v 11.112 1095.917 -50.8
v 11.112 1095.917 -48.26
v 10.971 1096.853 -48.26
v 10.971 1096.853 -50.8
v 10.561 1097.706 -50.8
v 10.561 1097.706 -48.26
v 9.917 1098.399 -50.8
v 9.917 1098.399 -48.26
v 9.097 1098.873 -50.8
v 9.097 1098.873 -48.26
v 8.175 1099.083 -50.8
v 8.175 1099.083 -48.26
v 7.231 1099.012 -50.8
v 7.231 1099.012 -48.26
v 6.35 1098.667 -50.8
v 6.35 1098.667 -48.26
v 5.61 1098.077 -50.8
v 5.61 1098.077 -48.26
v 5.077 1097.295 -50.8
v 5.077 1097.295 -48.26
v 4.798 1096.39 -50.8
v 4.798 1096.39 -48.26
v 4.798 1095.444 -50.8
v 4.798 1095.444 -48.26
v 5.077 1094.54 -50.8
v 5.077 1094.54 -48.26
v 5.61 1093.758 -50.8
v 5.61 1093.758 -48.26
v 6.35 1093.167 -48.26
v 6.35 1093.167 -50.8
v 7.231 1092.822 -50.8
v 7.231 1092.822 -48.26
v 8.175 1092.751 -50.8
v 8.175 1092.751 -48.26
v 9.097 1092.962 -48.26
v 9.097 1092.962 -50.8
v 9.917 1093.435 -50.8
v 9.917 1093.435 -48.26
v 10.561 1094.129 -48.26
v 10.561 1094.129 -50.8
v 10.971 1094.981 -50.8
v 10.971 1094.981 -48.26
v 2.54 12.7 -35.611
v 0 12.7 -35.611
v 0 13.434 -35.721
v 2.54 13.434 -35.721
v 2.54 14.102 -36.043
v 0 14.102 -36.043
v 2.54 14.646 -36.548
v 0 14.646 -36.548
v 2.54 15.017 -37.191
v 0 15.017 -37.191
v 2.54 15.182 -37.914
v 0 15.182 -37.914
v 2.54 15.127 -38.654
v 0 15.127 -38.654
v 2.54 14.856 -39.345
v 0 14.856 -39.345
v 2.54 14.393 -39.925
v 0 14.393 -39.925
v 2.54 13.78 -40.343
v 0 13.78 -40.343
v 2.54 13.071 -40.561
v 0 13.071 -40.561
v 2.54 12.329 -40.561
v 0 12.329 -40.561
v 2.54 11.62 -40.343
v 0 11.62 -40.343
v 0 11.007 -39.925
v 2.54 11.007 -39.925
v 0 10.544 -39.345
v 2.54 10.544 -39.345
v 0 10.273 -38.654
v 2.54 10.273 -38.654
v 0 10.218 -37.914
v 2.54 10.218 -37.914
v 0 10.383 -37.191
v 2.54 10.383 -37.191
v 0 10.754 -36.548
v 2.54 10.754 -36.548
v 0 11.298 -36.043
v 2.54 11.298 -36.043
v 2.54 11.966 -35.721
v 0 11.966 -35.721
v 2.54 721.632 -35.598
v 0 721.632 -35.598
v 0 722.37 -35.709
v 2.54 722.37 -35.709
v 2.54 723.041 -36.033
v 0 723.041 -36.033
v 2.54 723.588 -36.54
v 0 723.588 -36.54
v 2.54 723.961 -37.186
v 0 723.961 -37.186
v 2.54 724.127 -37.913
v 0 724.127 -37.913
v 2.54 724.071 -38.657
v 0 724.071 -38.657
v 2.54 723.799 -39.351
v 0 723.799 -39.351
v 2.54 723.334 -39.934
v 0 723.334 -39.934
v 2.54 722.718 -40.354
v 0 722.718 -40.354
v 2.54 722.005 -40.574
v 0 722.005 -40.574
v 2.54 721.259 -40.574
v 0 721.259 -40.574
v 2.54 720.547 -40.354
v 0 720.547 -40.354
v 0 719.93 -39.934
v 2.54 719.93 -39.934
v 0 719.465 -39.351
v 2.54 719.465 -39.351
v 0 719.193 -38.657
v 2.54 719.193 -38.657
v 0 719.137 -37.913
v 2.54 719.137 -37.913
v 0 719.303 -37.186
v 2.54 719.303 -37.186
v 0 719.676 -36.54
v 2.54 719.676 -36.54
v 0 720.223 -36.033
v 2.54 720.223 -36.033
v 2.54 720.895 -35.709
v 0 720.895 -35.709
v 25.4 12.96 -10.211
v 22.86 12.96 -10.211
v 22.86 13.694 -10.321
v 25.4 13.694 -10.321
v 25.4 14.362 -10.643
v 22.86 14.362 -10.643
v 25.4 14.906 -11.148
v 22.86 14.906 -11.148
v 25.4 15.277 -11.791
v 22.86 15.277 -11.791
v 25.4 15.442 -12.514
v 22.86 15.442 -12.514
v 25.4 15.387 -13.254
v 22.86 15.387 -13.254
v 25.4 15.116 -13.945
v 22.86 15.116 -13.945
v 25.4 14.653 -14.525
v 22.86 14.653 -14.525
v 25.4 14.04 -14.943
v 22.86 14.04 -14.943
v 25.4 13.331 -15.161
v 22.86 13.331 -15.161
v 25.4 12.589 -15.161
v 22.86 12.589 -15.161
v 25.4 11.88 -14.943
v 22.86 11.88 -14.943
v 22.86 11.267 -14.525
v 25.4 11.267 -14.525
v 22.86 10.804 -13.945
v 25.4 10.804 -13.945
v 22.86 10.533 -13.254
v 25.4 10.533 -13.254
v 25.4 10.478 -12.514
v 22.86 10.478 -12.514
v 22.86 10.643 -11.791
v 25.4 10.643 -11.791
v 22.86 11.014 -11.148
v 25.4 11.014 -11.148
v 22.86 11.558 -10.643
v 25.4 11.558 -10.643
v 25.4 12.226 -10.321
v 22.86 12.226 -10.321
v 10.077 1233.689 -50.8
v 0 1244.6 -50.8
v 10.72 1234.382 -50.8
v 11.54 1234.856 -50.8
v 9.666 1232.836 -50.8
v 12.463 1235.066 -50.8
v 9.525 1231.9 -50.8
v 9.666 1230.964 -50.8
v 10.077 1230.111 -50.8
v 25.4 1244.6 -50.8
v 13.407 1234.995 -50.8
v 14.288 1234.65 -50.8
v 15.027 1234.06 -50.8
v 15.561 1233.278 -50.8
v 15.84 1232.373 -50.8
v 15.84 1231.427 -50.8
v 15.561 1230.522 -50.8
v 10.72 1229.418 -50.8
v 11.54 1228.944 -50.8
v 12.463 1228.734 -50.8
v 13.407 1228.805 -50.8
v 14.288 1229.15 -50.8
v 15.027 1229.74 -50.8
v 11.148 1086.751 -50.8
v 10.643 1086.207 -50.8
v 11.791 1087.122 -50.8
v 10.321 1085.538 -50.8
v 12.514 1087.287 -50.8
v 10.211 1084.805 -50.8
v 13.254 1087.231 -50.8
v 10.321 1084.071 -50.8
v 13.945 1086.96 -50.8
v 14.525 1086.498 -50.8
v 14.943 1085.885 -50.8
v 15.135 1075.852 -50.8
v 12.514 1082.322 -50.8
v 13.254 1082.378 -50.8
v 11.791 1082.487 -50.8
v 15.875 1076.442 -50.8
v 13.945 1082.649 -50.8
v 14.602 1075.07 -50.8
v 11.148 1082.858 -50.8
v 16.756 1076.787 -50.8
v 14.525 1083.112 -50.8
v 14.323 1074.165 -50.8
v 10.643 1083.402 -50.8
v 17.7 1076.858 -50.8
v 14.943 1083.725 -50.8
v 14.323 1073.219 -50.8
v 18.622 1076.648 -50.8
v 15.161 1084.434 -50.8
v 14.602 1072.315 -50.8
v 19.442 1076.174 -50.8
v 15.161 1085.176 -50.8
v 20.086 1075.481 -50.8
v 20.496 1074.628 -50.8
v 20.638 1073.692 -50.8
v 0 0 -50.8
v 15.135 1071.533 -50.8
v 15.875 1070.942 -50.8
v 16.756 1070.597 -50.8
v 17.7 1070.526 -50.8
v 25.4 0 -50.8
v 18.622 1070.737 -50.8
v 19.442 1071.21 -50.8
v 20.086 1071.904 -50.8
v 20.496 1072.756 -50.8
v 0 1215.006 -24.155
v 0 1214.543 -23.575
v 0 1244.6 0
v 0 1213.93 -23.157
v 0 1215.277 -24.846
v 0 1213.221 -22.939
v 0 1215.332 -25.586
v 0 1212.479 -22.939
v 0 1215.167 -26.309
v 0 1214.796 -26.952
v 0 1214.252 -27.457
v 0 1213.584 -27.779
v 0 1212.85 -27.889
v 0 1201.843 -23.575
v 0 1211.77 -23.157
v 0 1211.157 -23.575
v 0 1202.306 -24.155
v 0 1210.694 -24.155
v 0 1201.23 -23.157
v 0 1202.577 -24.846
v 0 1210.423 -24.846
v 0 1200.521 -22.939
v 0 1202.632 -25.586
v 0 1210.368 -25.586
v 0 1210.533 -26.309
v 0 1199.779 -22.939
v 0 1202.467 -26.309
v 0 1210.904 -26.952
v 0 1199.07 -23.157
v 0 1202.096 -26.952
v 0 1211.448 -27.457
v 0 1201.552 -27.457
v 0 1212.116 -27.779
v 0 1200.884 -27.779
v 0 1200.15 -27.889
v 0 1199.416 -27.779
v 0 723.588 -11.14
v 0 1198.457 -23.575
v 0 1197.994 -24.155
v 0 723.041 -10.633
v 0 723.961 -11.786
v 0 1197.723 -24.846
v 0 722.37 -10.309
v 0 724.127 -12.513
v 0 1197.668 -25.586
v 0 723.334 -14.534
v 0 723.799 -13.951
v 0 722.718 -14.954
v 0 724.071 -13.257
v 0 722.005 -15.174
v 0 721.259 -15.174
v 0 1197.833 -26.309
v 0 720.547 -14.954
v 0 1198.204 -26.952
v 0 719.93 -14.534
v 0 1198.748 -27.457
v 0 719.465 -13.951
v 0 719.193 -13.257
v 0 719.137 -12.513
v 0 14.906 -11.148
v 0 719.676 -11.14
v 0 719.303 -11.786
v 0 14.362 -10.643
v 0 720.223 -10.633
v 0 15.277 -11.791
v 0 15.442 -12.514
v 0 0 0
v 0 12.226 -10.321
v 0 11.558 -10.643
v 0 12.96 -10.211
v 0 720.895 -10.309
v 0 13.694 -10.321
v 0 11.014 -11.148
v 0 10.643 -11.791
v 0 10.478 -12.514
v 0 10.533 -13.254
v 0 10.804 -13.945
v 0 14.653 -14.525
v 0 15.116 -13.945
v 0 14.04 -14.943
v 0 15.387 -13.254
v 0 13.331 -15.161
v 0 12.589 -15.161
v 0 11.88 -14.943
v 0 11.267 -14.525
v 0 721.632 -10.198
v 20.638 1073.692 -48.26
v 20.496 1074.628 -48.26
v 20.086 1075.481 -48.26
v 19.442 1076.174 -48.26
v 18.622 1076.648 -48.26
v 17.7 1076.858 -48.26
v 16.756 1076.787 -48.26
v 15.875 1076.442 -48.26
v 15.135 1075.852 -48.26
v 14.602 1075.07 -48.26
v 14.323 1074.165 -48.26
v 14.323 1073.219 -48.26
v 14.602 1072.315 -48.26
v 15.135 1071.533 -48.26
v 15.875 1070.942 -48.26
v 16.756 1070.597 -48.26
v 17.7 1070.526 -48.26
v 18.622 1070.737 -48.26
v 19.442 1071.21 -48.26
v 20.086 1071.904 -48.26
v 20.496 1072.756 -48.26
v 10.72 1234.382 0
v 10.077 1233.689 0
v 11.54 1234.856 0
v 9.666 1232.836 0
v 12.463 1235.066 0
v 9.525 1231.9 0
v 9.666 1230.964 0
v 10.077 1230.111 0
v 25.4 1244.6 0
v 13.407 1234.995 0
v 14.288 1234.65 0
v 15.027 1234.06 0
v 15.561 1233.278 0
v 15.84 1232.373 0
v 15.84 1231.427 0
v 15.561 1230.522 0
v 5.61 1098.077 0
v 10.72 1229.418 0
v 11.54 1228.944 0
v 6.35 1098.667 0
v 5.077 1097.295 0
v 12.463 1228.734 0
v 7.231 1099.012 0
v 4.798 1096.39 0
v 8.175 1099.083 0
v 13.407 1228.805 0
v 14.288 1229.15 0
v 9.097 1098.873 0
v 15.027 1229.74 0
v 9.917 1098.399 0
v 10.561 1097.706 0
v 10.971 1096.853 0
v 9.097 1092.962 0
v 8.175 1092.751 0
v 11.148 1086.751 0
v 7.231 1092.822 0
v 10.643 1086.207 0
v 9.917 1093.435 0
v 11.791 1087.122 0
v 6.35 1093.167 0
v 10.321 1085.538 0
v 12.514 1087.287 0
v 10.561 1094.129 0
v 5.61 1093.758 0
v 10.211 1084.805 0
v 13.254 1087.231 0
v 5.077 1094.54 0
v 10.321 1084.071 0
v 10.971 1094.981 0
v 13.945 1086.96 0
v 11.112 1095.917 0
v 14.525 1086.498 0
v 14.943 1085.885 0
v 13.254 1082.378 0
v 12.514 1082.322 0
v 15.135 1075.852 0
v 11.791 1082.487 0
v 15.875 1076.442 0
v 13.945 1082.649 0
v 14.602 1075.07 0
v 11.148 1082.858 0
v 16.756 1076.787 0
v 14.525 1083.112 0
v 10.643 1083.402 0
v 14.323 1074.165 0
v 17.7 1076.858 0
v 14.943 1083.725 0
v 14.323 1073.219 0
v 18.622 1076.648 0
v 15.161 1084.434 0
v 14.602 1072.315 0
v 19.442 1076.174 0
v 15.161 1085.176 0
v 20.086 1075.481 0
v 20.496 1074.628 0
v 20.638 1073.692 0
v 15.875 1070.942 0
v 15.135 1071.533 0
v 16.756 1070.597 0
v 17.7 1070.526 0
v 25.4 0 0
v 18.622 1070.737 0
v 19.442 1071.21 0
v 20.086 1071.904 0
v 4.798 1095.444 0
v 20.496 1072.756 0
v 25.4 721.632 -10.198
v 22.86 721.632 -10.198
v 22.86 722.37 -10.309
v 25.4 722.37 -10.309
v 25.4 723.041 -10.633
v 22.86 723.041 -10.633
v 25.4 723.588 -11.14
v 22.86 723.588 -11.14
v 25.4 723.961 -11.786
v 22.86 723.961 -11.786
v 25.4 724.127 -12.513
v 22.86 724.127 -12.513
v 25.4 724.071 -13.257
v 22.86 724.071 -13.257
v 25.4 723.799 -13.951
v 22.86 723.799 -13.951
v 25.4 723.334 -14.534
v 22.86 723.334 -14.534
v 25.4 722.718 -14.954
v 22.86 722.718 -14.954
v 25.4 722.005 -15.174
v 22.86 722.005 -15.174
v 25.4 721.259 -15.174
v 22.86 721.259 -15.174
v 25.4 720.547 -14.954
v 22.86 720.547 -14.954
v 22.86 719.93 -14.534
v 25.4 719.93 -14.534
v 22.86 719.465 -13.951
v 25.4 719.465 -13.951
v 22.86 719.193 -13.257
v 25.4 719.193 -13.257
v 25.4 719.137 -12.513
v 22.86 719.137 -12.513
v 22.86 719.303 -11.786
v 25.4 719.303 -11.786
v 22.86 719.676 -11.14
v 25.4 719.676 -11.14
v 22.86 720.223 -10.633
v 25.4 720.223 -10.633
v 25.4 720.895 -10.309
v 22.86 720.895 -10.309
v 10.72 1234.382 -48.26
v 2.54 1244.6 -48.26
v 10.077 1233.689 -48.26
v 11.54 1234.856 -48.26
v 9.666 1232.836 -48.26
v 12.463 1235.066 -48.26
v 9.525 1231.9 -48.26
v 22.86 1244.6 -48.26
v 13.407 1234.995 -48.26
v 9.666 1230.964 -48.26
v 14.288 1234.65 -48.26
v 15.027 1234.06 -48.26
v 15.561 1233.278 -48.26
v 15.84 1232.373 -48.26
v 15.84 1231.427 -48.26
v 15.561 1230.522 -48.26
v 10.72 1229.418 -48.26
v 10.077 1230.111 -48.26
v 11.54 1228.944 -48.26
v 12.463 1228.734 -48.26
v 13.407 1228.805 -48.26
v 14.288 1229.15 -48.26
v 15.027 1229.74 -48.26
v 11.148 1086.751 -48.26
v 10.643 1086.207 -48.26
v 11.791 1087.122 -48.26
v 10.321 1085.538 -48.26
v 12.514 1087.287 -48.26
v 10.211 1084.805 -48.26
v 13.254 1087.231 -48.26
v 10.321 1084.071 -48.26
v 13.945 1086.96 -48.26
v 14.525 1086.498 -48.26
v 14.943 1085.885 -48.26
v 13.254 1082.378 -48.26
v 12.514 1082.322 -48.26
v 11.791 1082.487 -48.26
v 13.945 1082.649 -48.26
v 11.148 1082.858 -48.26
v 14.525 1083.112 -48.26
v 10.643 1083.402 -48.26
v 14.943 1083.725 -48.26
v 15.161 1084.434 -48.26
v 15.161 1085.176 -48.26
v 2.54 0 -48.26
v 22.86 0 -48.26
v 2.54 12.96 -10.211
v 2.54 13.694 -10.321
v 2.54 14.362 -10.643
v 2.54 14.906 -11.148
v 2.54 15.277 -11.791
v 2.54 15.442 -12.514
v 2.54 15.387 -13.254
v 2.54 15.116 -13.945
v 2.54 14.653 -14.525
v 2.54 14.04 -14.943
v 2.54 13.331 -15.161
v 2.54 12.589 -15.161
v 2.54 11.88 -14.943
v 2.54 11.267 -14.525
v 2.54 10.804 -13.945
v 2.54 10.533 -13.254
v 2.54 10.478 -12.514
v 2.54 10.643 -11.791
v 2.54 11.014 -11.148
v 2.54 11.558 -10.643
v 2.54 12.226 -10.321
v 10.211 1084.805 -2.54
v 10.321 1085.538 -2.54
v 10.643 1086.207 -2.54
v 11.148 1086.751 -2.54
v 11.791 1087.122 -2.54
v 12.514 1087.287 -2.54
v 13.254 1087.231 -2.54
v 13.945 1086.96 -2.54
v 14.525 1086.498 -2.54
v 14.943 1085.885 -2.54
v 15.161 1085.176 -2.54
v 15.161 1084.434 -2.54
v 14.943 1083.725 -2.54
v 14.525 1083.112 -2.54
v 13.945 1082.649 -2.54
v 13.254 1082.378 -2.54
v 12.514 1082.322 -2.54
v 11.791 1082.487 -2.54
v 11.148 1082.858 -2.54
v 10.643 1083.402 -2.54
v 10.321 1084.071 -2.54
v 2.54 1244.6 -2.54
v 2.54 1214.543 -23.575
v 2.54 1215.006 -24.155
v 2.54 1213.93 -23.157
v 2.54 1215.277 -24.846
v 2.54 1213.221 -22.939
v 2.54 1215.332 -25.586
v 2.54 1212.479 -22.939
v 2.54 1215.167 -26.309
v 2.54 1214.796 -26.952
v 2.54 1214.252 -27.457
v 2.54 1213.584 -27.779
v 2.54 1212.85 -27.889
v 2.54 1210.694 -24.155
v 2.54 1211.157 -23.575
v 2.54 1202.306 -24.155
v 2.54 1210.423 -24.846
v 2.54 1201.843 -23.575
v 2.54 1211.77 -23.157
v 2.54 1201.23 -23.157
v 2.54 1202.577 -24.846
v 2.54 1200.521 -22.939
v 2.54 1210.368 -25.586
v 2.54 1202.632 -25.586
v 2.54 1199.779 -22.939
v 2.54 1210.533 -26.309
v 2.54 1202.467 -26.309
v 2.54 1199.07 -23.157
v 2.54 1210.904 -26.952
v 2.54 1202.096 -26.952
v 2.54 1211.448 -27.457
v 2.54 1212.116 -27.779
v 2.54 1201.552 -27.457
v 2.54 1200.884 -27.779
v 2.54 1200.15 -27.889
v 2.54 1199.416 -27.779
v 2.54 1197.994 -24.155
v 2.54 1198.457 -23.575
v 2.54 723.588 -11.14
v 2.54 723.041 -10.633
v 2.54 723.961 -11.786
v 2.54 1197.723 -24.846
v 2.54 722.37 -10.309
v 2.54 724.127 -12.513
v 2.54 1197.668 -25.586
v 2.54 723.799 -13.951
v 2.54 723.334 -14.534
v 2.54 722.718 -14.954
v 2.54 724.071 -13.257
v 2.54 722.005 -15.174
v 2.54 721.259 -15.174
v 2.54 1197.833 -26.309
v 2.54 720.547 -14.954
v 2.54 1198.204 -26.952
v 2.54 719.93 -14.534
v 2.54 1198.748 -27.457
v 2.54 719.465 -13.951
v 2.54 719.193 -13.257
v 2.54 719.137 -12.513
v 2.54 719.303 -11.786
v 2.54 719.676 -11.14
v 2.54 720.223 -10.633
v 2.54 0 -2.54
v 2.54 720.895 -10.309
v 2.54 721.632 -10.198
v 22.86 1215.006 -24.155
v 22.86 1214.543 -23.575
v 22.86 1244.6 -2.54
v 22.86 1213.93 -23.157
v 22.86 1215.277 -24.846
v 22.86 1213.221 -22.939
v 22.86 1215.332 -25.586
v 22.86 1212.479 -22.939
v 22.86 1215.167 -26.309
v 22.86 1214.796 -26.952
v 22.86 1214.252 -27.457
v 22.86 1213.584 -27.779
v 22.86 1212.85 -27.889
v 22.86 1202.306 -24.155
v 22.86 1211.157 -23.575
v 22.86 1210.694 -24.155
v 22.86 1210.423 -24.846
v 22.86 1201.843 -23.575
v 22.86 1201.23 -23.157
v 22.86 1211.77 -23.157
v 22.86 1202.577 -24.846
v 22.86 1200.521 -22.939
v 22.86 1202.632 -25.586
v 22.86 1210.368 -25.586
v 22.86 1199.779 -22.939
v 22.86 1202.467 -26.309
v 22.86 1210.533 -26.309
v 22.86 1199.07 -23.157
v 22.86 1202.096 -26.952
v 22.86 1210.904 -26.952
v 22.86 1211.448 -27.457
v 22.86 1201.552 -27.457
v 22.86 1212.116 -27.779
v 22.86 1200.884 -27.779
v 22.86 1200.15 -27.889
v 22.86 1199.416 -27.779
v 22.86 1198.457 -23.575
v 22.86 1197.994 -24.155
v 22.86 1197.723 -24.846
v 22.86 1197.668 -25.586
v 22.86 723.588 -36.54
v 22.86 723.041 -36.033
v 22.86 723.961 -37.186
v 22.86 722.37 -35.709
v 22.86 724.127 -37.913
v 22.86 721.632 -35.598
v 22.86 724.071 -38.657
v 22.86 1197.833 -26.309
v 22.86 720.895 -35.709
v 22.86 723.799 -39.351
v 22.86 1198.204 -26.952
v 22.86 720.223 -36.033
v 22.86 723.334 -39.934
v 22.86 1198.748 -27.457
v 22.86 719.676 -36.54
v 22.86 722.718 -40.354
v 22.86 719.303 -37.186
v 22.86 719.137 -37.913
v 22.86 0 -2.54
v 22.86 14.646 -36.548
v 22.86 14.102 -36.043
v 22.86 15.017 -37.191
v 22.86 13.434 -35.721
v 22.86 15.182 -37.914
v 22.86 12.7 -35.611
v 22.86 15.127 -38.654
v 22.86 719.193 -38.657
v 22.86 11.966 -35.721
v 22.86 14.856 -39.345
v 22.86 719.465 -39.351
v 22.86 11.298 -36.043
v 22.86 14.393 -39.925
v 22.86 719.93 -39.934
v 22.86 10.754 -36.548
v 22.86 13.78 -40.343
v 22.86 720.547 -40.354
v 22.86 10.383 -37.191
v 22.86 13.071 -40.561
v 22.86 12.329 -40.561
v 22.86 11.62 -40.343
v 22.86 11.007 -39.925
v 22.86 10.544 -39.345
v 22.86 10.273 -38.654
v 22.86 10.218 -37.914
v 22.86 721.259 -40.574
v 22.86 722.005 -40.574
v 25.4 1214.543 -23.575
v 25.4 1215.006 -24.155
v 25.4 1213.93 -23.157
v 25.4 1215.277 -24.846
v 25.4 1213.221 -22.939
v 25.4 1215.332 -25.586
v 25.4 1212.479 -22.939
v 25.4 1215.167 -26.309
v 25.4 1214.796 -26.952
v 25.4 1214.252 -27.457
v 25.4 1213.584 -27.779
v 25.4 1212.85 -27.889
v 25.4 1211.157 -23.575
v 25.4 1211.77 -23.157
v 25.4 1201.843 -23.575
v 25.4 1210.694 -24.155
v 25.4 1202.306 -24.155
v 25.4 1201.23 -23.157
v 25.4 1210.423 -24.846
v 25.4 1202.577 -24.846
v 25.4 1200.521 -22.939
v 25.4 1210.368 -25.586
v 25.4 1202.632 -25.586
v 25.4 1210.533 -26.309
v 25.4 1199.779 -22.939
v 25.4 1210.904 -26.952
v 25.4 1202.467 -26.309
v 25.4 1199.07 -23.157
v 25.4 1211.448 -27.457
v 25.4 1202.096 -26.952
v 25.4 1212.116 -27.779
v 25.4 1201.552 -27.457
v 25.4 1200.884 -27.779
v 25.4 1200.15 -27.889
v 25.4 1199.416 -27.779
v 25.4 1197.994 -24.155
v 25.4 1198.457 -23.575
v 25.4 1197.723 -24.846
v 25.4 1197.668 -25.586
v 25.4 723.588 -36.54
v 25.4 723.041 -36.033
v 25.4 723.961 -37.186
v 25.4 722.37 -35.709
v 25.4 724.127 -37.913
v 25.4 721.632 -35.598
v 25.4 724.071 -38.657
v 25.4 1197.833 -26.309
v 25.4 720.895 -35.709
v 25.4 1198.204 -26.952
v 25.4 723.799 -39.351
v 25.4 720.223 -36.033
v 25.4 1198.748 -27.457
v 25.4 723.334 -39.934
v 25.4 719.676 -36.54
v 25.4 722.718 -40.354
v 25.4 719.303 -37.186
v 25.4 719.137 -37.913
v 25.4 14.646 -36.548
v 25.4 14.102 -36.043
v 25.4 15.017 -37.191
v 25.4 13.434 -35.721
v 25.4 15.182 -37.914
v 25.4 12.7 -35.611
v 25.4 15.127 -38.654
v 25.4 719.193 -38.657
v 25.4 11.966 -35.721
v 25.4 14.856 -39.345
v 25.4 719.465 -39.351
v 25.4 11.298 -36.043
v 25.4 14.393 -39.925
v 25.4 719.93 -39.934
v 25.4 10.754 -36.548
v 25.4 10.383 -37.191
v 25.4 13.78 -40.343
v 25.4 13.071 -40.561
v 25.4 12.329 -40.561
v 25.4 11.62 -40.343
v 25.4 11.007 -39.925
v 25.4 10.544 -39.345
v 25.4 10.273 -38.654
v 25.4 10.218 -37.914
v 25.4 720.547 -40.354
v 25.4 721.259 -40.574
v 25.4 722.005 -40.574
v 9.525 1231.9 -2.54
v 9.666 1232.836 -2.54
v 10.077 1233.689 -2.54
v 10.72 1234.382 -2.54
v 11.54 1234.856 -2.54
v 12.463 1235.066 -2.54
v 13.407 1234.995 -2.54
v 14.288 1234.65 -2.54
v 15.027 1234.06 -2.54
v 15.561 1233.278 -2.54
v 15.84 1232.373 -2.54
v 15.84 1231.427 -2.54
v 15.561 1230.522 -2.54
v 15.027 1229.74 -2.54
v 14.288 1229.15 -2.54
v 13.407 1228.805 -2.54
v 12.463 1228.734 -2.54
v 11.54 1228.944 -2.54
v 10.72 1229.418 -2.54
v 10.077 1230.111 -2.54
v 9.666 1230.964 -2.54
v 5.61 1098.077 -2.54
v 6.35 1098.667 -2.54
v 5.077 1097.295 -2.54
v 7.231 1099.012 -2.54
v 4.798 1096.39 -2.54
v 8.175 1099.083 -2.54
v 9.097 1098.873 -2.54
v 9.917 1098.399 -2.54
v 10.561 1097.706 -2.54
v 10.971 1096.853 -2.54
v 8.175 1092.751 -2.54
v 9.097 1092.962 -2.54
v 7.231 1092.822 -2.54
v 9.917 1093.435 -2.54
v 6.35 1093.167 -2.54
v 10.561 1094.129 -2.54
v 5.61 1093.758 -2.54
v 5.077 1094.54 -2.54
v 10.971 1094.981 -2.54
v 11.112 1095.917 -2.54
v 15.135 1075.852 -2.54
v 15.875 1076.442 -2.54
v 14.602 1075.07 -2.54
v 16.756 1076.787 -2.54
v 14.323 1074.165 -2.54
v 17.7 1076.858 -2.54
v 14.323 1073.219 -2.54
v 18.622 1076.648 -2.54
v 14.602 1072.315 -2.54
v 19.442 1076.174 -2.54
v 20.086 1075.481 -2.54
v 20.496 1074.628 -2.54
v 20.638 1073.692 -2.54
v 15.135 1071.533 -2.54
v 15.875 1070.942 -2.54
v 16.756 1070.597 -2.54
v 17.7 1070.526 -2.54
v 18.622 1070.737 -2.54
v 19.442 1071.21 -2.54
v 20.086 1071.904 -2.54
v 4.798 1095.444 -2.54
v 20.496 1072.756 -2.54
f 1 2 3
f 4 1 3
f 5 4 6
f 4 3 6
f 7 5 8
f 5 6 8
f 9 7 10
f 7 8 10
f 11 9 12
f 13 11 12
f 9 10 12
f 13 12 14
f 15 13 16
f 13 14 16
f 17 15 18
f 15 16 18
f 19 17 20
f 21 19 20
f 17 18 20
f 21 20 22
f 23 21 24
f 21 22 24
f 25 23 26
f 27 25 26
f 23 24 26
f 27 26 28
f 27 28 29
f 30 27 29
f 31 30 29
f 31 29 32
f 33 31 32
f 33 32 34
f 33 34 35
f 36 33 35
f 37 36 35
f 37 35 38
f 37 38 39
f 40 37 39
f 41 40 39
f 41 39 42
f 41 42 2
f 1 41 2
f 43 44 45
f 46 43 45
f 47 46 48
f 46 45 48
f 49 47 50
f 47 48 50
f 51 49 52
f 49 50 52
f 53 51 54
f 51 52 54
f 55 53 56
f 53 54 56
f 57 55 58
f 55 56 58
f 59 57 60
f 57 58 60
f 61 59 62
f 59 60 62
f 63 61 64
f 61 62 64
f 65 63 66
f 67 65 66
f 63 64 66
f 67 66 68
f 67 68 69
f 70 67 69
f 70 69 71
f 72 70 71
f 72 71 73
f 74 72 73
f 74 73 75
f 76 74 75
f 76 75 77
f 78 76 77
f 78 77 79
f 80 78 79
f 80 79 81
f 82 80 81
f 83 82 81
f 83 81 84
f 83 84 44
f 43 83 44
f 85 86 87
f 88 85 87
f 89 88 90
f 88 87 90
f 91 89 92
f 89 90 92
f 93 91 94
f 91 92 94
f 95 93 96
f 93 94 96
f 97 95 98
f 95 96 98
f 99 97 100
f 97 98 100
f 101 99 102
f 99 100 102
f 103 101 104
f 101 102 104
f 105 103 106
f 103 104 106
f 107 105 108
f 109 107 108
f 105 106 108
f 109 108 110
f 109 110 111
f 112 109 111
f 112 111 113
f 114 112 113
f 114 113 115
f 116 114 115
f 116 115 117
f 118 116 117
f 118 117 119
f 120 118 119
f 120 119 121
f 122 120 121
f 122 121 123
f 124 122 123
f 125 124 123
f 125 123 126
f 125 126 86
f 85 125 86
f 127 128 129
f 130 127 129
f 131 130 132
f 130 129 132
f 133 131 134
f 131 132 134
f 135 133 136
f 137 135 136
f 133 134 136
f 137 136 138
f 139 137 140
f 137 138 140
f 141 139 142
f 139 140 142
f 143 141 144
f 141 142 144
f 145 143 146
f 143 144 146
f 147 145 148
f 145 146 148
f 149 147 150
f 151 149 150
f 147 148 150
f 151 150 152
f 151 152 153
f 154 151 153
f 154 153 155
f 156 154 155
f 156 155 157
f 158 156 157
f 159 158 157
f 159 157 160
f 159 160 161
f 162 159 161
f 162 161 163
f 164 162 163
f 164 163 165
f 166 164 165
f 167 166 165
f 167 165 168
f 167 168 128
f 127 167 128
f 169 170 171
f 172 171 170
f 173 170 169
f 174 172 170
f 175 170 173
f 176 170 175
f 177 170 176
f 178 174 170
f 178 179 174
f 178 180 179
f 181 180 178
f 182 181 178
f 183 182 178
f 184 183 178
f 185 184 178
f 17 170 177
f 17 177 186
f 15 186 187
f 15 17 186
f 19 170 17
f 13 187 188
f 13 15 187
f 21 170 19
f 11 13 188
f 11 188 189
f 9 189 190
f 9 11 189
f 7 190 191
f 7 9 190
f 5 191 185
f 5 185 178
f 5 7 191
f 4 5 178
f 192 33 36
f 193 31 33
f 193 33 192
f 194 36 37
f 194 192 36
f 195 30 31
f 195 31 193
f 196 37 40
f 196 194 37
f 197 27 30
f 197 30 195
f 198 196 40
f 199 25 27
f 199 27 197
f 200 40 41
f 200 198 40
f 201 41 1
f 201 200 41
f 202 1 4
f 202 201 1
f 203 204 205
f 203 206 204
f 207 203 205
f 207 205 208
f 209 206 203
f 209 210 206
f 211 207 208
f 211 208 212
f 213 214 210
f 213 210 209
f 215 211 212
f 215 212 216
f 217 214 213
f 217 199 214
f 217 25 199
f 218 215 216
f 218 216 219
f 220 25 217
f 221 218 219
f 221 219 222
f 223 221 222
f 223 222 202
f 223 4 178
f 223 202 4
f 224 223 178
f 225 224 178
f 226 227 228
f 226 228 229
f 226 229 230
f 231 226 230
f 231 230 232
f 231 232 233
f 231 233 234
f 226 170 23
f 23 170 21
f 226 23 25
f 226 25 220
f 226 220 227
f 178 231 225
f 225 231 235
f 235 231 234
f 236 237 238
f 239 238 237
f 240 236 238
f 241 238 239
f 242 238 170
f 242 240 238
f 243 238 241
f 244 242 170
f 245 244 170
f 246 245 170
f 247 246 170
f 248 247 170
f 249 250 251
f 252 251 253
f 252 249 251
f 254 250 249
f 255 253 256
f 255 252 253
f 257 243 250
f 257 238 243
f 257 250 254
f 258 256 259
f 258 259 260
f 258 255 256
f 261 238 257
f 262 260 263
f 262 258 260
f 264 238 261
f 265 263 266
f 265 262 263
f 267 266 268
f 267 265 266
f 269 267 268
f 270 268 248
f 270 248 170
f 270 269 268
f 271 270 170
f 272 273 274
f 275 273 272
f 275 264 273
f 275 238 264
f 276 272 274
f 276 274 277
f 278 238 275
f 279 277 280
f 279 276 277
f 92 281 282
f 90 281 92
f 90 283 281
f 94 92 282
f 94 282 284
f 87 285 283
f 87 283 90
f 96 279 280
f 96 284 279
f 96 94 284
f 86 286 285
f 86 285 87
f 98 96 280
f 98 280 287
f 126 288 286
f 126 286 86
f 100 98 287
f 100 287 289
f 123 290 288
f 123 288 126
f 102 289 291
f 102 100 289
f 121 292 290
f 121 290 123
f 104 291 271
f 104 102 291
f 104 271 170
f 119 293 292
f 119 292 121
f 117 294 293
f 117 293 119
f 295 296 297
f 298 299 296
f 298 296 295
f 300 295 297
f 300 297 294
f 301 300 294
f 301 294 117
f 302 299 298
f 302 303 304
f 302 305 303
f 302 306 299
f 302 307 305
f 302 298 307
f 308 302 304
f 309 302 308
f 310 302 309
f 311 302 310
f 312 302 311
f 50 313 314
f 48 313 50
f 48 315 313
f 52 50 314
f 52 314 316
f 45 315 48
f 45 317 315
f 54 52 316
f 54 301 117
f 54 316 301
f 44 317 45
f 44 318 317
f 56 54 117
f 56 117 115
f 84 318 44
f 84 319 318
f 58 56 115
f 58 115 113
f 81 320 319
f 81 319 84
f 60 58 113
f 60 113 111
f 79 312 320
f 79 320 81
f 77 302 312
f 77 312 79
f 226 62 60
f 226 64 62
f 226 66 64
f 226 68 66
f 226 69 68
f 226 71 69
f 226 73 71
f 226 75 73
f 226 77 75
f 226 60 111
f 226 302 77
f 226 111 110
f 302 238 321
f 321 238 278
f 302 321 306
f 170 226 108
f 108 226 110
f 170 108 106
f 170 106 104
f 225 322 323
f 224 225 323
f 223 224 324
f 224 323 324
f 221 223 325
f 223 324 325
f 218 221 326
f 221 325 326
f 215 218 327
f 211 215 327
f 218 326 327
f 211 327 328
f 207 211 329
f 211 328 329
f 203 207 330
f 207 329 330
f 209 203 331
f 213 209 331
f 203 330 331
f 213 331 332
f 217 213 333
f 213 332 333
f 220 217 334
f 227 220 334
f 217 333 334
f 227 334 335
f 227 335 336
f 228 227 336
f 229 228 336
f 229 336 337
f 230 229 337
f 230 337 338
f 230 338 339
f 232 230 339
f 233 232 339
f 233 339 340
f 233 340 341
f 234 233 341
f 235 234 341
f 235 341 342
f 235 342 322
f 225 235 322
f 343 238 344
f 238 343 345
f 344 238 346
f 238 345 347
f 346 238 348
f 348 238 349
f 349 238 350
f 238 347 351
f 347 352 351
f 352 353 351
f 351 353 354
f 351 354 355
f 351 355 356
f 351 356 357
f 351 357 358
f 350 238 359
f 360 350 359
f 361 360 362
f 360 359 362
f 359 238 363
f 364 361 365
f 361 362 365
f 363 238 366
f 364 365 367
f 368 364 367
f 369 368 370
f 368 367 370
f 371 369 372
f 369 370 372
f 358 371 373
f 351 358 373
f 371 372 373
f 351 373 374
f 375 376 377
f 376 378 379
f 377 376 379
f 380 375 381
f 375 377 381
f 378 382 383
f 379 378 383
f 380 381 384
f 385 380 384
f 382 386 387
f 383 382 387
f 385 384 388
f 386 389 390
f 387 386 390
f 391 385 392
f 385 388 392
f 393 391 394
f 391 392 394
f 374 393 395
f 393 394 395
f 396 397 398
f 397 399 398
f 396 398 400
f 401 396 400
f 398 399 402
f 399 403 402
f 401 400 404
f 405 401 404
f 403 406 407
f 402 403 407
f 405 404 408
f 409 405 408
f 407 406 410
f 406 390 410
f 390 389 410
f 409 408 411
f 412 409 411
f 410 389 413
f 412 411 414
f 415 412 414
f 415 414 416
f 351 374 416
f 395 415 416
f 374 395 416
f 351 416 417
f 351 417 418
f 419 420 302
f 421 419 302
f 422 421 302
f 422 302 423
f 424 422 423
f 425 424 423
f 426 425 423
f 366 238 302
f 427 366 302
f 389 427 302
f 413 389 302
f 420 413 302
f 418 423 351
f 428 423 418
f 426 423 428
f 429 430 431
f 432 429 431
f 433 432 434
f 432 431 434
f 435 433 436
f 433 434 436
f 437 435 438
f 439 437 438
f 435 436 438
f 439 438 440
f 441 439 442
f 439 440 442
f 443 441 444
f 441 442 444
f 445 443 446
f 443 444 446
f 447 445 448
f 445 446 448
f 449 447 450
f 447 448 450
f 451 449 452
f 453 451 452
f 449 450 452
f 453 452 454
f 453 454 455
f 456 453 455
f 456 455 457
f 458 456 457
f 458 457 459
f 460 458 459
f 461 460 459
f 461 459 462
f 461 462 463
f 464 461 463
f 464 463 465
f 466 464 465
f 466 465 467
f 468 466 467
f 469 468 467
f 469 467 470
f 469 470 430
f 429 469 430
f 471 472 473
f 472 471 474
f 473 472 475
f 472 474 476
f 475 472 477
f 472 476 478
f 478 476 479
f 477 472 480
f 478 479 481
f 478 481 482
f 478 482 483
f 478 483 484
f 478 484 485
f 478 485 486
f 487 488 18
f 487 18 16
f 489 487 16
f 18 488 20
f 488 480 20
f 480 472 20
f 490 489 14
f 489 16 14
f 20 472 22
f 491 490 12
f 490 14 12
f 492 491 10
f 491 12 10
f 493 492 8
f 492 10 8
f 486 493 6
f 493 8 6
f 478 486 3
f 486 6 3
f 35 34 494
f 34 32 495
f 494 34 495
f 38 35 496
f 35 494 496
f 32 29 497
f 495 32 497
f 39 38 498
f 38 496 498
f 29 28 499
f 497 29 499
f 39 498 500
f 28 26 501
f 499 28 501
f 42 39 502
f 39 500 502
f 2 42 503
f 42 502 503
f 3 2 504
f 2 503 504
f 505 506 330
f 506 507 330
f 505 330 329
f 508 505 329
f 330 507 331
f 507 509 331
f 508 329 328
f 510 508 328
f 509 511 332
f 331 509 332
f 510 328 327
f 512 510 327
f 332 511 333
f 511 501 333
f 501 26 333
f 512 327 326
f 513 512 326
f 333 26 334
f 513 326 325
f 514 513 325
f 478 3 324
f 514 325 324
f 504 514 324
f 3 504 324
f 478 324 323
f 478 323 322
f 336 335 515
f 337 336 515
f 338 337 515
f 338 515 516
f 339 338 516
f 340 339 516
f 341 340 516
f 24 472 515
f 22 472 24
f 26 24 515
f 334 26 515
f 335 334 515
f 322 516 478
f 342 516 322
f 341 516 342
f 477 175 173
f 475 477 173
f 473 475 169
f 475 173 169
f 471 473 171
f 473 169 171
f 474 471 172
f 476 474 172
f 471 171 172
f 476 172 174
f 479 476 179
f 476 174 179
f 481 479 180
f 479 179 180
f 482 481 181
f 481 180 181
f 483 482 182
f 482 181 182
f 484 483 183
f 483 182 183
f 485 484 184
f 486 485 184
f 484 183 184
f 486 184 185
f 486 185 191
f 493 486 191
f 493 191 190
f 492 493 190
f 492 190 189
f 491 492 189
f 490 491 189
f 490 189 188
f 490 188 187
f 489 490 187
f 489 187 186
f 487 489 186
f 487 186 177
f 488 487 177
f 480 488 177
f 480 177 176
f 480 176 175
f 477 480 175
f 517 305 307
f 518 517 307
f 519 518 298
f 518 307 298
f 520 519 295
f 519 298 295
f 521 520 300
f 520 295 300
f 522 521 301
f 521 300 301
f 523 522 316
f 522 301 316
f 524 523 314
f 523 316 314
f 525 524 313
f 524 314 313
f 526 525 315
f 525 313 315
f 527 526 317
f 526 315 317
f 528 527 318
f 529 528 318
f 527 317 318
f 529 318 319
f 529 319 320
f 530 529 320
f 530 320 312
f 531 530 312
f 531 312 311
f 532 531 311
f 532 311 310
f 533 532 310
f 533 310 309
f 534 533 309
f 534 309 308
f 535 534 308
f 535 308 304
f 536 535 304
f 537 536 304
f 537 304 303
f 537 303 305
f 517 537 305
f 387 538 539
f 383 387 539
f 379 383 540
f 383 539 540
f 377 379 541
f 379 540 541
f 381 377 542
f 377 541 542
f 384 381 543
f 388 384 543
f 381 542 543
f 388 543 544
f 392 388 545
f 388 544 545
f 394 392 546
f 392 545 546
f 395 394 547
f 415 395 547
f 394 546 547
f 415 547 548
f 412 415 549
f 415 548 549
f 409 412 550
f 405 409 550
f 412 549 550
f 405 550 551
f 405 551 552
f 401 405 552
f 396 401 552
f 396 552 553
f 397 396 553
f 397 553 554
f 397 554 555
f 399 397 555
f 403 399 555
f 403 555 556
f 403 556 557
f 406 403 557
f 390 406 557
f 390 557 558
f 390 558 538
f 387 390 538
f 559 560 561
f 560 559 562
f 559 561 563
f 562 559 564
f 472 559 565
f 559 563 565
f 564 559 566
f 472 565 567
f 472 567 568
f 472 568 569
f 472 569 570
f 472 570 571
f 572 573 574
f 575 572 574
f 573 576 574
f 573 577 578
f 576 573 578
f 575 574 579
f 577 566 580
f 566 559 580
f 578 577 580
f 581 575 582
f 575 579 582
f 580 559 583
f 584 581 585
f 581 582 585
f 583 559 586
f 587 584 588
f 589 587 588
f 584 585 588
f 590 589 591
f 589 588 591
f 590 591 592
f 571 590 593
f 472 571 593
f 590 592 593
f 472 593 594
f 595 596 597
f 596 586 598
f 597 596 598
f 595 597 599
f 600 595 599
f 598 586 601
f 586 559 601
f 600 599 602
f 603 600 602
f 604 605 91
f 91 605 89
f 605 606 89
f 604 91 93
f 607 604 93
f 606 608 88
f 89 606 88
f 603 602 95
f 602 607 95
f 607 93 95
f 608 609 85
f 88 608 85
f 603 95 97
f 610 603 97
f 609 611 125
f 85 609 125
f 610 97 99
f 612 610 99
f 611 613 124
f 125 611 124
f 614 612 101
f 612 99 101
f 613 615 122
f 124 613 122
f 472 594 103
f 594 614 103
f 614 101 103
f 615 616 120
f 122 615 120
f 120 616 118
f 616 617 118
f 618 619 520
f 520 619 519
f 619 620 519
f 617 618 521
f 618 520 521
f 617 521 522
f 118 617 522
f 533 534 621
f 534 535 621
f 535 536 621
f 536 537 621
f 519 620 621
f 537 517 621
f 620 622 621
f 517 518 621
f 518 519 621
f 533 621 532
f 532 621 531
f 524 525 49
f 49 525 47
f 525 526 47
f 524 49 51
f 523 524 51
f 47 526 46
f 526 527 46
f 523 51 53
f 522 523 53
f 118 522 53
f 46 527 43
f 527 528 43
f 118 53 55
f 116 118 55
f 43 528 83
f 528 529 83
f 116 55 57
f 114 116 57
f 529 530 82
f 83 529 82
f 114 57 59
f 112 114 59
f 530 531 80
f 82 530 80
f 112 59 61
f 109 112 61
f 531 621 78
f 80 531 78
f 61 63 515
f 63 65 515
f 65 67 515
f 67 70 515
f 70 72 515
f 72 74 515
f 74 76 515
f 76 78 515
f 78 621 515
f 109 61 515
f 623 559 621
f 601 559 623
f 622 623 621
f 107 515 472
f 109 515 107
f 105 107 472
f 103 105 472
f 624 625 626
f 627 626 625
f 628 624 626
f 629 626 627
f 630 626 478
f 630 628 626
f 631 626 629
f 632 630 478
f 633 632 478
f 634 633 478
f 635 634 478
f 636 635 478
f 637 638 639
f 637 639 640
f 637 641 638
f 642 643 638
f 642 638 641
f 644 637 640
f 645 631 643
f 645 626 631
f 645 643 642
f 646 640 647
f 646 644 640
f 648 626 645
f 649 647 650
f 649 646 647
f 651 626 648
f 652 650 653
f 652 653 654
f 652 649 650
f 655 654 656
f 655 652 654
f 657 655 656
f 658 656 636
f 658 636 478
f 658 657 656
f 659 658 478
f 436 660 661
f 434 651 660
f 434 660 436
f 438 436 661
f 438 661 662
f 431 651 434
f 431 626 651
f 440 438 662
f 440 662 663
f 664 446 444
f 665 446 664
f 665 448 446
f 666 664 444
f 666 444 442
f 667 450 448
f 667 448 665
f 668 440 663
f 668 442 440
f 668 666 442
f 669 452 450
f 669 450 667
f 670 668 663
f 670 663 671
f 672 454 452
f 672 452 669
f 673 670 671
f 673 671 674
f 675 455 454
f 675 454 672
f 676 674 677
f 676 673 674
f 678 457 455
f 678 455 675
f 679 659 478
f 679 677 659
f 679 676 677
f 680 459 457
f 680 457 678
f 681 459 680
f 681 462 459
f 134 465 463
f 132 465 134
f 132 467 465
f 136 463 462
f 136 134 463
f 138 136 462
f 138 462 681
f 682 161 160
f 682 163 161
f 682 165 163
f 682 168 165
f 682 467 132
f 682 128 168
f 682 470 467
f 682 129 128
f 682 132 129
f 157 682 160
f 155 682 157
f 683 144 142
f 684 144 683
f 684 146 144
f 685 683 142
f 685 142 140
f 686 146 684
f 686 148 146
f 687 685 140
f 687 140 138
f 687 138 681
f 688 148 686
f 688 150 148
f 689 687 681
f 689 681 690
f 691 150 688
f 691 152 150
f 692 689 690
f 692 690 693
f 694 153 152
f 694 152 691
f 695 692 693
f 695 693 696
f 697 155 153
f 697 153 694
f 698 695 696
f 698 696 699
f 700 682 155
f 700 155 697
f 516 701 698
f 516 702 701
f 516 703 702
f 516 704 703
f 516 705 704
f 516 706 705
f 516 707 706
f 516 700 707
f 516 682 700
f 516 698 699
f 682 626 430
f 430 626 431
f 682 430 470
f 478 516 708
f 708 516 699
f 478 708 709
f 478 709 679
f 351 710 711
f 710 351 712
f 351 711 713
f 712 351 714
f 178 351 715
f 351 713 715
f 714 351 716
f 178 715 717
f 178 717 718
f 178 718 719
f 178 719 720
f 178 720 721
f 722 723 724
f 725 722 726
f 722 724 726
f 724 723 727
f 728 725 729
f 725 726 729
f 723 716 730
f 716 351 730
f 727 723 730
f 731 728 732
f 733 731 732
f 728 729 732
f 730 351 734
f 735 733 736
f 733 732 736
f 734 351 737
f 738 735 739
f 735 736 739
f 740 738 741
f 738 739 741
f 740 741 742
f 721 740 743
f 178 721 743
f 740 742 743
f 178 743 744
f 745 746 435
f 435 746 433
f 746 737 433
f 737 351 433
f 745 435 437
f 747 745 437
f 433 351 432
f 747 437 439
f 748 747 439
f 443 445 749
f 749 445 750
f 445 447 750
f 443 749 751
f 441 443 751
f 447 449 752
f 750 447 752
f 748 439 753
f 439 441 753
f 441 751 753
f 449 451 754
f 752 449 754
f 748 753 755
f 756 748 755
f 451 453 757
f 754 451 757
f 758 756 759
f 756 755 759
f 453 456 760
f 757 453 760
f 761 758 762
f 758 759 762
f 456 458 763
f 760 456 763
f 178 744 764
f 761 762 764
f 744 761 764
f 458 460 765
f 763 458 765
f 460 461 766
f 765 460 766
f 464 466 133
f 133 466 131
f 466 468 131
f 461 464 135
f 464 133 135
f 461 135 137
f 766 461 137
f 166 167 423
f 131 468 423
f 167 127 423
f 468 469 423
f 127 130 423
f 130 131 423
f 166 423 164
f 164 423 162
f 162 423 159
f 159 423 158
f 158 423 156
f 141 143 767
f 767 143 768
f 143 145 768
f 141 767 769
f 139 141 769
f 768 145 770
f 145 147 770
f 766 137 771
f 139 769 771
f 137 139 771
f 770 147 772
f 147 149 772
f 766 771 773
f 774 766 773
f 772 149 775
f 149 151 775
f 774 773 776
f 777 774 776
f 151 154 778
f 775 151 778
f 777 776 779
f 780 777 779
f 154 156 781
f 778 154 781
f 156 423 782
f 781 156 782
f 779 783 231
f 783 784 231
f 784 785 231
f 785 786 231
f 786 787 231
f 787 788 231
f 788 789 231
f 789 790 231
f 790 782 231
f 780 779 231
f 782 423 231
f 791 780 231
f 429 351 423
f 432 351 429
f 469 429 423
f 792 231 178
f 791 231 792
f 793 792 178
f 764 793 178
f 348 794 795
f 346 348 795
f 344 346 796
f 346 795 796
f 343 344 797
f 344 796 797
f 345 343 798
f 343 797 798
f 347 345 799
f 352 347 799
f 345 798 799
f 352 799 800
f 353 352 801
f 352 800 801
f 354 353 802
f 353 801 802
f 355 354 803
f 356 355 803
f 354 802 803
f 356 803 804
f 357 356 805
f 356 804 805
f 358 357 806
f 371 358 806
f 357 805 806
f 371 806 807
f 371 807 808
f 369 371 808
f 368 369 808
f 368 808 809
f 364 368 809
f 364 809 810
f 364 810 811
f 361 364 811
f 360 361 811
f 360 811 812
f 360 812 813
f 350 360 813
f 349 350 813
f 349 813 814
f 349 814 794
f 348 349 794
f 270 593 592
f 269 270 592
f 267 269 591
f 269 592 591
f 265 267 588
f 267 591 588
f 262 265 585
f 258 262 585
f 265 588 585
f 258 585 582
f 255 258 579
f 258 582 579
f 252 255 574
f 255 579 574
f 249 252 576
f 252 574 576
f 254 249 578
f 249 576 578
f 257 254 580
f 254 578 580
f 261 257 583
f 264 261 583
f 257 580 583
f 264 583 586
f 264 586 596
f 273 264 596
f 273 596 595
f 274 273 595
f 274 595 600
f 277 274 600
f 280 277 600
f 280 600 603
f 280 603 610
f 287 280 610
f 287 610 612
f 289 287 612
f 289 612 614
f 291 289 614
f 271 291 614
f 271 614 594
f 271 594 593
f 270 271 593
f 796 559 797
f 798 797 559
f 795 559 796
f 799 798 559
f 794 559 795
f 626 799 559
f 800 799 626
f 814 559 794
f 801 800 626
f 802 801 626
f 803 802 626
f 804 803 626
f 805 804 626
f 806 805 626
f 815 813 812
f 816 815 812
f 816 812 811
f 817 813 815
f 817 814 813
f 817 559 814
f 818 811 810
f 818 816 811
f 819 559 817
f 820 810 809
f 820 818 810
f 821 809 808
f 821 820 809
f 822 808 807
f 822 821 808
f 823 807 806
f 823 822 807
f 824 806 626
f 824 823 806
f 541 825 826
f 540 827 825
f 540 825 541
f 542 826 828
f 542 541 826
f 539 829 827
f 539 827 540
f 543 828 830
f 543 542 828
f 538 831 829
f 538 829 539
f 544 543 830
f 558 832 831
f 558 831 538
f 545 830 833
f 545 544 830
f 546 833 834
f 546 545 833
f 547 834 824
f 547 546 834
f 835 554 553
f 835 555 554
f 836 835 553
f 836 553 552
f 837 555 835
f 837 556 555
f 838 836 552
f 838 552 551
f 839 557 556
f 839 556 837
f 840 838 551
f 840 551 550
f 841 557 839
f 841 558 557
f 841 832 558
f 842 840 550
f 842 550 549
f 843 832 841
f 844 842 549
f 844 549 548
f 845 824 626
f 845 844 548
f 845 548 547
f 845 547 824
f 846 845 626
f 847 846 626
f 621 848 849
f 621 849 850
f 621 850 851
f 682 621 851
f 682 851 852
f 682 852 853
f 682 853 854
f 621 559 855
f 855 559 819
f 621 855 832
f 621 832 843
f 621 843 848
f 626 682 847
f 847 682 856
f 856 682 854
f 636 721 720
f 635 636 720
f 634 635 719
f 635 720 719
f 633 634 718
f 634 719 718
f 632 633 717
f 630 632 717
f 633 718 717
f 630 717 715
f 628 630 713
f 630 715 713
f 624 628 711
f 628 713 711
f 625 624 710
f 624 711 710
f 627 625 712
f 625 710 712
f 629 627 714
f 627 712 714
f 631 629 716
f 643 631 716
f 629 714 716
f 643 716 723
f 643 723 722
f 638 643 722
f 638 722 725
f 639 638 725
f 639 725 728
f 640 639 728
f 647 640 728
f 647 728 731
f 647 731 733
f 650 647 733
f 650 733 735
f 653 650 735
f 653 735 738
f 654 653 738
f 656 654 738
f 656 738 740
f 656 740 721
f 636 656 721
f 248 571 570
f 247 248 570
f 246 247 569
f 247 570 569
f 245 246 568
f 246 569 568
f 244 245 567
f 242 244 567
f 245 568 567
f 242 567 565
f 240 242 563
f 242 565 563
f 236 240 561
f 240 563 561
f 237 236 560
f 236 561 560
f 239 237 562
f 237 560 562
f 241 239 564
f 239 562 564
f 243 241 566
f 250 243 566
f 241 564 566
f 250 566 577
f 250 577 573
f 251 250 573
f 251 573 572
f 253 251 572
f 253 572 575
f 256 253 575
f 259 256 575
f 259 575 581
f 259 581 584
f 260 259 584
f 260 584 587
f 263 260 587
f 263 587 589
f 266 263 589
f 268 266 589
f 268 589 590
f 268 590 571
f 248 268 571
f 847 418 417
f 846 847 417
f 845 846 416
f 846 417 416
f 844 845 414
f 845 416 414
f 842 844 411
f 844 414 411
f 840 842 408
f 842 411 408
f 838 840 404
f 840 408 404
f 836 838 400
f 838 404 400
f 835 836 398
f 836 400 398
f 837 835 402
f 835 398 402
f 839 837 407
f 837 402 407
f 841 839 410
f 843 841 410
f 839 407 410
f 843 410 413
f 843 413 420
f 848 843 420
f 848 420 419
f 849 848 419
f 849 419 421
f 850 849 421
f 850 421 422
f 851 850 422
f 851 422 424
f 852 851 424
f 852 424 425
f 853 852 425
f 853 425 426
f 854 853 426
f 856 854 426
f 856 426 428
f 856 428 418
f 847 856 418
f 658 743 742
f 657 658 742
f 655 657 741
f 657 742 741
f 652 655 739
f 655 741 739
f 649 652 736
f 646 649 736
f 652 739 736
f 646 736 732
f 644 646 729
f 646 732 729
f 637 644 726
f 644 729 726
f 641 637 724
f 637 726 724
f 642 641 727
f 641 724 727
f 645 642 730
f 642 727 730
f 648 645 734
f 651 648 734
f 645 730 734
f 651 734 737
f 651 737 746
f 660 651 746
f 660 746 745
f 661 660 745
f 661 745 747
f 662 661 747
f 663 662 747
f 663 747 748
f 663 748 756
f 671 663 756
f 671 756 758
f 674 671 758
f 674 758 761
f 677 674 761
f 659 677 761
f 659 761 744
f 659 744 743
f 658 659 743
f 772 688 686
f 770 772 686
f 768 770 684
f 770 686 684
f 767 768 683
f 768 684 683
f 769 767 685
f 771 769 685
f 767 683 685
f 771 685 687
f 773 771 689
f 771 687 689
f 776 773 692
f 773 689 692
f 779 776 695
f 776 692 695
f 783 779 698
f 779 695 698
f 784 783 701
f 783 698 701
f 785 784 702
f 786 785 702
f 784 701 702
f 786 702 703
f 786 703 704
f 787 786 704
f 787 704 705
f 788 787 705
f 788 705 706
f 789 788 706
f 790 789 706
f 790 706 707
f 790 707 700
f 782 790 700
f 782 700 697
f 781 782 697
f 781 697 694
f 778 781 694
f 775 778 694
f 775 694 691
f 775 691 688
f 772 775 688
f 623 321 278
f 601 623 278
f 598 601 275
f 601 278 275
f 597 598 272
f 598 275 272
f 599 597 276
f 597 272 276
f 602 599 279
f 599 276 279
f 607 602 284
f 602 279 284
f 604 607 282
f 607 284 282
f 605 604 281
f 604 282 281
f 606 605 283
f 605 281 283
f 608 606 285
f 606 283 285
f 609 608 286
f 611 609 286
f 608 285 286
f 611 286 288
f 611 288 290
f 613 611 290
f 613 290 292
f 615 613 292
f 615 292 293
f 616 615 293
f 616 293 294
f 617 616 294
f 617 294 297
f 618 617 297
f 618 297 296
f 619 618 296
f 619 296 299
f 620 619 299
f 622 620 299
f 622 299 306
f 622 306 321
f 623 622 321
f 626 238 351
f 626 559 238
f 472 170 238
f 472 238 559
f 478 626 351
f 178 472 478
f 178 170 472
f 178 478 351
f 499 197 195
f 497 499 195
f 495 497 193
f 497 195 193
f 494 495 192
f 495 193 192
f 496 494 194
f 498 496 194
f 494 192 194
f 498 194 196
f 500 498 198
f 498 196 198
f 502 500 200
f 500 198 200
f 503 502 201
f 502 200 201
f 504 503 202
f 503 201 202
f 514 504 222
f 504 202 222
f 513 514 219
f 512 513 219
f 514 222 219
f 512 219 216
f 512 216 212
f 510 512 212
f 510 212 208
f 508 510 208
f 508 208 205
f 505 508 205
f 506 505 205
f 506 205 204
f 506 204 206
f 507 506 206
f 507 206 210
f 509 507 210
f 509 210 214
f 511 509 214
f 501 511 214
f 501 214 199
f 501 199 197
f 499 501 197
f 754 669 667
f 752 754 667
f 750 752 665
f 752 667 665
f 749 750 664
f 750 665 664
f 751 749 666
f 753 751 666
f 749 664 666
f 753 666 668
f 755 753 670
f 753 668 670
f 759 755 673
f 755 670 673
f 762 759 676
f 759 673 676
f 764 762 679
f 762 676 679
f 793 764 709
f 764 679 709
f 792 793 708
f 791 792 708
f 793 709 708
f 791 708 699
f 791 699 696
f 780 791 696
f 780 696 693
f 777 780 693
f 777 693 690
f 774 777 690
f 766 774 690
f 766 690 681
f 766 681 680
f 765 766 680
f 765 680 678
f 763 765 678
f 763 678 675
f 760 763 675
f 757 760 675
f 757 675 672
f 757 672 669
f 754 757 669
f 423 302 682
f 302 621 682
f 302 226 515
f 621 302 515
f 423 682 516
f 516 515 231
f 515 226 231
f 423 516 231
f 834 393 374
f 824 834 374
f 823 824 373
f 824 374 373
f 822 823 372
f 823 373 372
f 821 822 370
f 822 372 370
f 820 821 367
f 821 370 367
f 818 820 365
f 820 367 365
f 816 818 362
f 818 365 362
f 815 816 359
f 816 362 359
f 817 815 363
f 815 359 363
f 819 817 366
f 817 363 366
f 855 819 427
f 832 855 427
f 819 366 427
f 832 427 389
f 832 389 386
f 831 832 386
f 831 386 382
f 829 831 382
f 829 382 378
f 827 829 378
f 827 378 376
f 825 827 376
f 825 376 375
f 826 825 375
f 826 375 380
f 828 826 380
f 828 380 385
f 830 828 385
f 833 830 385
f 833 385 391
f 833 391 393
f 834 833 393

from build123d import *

# Parameters (mm, degrees)
SKETCH1_W           = 25.4
SKETCH1_H           = 50.8
SKETCH1_W_2         = 20.32
SKETCH1_H_2         = 45.72
EXTRUDE_THIN1_DEPTH = 1244.6
SKETCH2_R           = 2.4892
CUT_EXTRUDE1_DEPTH  = 26.4
SKETCH3_R           = 2.5019
SKETCH3_R_2         = 2.4892
CUT_EXTRUDE2_DEPTH  = 26.4
SKETCH5_R           = 2.4892
CUT_EXTRUDE3_DEPTH  = 51.8
SKETCH6_R           = 3.175
CUT_EXTRUDE4_DEPTH  = 51.8
SKETCH7_R           = 3.175
CUT_EXTRUDE5_DEPTH  = 51.8


with BuildPart() as part:
    # Sketch1 → Extrude-Thin1 (new body)
    with BuildSketch(Plane(origin=(0, 0, 0), x_dir=(1, 0, 0), z_dir=(0, 1, 0))):
        with Locations((12.7, 25.4)):
            Rectangle(SKETCH1_W, SKETCH1_H)
        with Locations((12.7, 25.4)):
            Rectangle(SKETCH1_W_2, SKETCH1_H_2, mode=Mode.SUBTRACT)
    extrude(amount=EXTRUDE_THIN1_DEPTH)

    # Sketch2 → Cut-Extrude1 (cut, through all)
    with BuildSketch(Plane(origin=(25.4, 0, 0), x_dir=(0, 0, -1), z_dir=(1, 0, 0))):
        with Locations((25.4, 1200.15)):
            Circle(SKETCH2_R)
        with Locations((25.4, 1212.85)):
            Circle(SKETCH2_R)
    extrude(amount=-CUT_EXTRUDE1_DEPTH, mode=Mode.SUBTRACT)

    # Sketch3 → Cut-Extrude2 (cut, through all)
    with BuildSketch(Plane.ZY):
        with Locations((-12.7, 721.632068306)):
            Circle(SKETCH3_R)
        with Locations((-38.1, 721.632068306)):
            Circle(SKETCH3_R)
        with Locations((-12.7, 12.960193373)):
            Circle(SKETCH3_R_2)
        with Locations((-38.1, 12.7)):
            Circle(SKETCH3_R_2)
    extrude(amount=-CUT_EXTRUDE2_DEPTH, mode=Mode.SUBTRACT)

    # Sketch5 → Cut-Extrude3 (cut, through all)
    with BuildSketch(Plane(origin=(0, 0, -50.8), x_dir=(-1, 0, 0), z_dir=(0, 0, -1))):
        with Locations((-12.7, 1084.8045868)):
            Circle(SKETCH5_R)
    extrude(amount=-CUT_EXTRUDE3_DEPTH, mode=Mode.SUBTRACT)

    # Sketch6 → Cut-Extrude4 (cut, through all)
    with BuildSketch(Plane(origin=(0, 0, -50.8), x_dir=(-1, 0, 0), z_dir=(0, 0, -1))):
        with Locations((-12.7, 1231.9)):
            Circle(SKETCH6_R)
    extrude(amount=-CUT_EXTRUDE4_DEPTH, mode=Mode.SUBTRACT)

    # Sketch7 → Cut-Extrude5 (cut, through all)
    with BuildSketch(Plane.XY):
        with Locations((7.9375, 1095.9170868)):
            Circle(SKETCH7_R)
        with Locations((17.4625, 1073.6920868)):
            Circle(SKETCH7_R)
    extrude(amount=-CUT_EXTRUDE5_DEPTH, mode=Mode.SUBTRACT)


solid = part.part
